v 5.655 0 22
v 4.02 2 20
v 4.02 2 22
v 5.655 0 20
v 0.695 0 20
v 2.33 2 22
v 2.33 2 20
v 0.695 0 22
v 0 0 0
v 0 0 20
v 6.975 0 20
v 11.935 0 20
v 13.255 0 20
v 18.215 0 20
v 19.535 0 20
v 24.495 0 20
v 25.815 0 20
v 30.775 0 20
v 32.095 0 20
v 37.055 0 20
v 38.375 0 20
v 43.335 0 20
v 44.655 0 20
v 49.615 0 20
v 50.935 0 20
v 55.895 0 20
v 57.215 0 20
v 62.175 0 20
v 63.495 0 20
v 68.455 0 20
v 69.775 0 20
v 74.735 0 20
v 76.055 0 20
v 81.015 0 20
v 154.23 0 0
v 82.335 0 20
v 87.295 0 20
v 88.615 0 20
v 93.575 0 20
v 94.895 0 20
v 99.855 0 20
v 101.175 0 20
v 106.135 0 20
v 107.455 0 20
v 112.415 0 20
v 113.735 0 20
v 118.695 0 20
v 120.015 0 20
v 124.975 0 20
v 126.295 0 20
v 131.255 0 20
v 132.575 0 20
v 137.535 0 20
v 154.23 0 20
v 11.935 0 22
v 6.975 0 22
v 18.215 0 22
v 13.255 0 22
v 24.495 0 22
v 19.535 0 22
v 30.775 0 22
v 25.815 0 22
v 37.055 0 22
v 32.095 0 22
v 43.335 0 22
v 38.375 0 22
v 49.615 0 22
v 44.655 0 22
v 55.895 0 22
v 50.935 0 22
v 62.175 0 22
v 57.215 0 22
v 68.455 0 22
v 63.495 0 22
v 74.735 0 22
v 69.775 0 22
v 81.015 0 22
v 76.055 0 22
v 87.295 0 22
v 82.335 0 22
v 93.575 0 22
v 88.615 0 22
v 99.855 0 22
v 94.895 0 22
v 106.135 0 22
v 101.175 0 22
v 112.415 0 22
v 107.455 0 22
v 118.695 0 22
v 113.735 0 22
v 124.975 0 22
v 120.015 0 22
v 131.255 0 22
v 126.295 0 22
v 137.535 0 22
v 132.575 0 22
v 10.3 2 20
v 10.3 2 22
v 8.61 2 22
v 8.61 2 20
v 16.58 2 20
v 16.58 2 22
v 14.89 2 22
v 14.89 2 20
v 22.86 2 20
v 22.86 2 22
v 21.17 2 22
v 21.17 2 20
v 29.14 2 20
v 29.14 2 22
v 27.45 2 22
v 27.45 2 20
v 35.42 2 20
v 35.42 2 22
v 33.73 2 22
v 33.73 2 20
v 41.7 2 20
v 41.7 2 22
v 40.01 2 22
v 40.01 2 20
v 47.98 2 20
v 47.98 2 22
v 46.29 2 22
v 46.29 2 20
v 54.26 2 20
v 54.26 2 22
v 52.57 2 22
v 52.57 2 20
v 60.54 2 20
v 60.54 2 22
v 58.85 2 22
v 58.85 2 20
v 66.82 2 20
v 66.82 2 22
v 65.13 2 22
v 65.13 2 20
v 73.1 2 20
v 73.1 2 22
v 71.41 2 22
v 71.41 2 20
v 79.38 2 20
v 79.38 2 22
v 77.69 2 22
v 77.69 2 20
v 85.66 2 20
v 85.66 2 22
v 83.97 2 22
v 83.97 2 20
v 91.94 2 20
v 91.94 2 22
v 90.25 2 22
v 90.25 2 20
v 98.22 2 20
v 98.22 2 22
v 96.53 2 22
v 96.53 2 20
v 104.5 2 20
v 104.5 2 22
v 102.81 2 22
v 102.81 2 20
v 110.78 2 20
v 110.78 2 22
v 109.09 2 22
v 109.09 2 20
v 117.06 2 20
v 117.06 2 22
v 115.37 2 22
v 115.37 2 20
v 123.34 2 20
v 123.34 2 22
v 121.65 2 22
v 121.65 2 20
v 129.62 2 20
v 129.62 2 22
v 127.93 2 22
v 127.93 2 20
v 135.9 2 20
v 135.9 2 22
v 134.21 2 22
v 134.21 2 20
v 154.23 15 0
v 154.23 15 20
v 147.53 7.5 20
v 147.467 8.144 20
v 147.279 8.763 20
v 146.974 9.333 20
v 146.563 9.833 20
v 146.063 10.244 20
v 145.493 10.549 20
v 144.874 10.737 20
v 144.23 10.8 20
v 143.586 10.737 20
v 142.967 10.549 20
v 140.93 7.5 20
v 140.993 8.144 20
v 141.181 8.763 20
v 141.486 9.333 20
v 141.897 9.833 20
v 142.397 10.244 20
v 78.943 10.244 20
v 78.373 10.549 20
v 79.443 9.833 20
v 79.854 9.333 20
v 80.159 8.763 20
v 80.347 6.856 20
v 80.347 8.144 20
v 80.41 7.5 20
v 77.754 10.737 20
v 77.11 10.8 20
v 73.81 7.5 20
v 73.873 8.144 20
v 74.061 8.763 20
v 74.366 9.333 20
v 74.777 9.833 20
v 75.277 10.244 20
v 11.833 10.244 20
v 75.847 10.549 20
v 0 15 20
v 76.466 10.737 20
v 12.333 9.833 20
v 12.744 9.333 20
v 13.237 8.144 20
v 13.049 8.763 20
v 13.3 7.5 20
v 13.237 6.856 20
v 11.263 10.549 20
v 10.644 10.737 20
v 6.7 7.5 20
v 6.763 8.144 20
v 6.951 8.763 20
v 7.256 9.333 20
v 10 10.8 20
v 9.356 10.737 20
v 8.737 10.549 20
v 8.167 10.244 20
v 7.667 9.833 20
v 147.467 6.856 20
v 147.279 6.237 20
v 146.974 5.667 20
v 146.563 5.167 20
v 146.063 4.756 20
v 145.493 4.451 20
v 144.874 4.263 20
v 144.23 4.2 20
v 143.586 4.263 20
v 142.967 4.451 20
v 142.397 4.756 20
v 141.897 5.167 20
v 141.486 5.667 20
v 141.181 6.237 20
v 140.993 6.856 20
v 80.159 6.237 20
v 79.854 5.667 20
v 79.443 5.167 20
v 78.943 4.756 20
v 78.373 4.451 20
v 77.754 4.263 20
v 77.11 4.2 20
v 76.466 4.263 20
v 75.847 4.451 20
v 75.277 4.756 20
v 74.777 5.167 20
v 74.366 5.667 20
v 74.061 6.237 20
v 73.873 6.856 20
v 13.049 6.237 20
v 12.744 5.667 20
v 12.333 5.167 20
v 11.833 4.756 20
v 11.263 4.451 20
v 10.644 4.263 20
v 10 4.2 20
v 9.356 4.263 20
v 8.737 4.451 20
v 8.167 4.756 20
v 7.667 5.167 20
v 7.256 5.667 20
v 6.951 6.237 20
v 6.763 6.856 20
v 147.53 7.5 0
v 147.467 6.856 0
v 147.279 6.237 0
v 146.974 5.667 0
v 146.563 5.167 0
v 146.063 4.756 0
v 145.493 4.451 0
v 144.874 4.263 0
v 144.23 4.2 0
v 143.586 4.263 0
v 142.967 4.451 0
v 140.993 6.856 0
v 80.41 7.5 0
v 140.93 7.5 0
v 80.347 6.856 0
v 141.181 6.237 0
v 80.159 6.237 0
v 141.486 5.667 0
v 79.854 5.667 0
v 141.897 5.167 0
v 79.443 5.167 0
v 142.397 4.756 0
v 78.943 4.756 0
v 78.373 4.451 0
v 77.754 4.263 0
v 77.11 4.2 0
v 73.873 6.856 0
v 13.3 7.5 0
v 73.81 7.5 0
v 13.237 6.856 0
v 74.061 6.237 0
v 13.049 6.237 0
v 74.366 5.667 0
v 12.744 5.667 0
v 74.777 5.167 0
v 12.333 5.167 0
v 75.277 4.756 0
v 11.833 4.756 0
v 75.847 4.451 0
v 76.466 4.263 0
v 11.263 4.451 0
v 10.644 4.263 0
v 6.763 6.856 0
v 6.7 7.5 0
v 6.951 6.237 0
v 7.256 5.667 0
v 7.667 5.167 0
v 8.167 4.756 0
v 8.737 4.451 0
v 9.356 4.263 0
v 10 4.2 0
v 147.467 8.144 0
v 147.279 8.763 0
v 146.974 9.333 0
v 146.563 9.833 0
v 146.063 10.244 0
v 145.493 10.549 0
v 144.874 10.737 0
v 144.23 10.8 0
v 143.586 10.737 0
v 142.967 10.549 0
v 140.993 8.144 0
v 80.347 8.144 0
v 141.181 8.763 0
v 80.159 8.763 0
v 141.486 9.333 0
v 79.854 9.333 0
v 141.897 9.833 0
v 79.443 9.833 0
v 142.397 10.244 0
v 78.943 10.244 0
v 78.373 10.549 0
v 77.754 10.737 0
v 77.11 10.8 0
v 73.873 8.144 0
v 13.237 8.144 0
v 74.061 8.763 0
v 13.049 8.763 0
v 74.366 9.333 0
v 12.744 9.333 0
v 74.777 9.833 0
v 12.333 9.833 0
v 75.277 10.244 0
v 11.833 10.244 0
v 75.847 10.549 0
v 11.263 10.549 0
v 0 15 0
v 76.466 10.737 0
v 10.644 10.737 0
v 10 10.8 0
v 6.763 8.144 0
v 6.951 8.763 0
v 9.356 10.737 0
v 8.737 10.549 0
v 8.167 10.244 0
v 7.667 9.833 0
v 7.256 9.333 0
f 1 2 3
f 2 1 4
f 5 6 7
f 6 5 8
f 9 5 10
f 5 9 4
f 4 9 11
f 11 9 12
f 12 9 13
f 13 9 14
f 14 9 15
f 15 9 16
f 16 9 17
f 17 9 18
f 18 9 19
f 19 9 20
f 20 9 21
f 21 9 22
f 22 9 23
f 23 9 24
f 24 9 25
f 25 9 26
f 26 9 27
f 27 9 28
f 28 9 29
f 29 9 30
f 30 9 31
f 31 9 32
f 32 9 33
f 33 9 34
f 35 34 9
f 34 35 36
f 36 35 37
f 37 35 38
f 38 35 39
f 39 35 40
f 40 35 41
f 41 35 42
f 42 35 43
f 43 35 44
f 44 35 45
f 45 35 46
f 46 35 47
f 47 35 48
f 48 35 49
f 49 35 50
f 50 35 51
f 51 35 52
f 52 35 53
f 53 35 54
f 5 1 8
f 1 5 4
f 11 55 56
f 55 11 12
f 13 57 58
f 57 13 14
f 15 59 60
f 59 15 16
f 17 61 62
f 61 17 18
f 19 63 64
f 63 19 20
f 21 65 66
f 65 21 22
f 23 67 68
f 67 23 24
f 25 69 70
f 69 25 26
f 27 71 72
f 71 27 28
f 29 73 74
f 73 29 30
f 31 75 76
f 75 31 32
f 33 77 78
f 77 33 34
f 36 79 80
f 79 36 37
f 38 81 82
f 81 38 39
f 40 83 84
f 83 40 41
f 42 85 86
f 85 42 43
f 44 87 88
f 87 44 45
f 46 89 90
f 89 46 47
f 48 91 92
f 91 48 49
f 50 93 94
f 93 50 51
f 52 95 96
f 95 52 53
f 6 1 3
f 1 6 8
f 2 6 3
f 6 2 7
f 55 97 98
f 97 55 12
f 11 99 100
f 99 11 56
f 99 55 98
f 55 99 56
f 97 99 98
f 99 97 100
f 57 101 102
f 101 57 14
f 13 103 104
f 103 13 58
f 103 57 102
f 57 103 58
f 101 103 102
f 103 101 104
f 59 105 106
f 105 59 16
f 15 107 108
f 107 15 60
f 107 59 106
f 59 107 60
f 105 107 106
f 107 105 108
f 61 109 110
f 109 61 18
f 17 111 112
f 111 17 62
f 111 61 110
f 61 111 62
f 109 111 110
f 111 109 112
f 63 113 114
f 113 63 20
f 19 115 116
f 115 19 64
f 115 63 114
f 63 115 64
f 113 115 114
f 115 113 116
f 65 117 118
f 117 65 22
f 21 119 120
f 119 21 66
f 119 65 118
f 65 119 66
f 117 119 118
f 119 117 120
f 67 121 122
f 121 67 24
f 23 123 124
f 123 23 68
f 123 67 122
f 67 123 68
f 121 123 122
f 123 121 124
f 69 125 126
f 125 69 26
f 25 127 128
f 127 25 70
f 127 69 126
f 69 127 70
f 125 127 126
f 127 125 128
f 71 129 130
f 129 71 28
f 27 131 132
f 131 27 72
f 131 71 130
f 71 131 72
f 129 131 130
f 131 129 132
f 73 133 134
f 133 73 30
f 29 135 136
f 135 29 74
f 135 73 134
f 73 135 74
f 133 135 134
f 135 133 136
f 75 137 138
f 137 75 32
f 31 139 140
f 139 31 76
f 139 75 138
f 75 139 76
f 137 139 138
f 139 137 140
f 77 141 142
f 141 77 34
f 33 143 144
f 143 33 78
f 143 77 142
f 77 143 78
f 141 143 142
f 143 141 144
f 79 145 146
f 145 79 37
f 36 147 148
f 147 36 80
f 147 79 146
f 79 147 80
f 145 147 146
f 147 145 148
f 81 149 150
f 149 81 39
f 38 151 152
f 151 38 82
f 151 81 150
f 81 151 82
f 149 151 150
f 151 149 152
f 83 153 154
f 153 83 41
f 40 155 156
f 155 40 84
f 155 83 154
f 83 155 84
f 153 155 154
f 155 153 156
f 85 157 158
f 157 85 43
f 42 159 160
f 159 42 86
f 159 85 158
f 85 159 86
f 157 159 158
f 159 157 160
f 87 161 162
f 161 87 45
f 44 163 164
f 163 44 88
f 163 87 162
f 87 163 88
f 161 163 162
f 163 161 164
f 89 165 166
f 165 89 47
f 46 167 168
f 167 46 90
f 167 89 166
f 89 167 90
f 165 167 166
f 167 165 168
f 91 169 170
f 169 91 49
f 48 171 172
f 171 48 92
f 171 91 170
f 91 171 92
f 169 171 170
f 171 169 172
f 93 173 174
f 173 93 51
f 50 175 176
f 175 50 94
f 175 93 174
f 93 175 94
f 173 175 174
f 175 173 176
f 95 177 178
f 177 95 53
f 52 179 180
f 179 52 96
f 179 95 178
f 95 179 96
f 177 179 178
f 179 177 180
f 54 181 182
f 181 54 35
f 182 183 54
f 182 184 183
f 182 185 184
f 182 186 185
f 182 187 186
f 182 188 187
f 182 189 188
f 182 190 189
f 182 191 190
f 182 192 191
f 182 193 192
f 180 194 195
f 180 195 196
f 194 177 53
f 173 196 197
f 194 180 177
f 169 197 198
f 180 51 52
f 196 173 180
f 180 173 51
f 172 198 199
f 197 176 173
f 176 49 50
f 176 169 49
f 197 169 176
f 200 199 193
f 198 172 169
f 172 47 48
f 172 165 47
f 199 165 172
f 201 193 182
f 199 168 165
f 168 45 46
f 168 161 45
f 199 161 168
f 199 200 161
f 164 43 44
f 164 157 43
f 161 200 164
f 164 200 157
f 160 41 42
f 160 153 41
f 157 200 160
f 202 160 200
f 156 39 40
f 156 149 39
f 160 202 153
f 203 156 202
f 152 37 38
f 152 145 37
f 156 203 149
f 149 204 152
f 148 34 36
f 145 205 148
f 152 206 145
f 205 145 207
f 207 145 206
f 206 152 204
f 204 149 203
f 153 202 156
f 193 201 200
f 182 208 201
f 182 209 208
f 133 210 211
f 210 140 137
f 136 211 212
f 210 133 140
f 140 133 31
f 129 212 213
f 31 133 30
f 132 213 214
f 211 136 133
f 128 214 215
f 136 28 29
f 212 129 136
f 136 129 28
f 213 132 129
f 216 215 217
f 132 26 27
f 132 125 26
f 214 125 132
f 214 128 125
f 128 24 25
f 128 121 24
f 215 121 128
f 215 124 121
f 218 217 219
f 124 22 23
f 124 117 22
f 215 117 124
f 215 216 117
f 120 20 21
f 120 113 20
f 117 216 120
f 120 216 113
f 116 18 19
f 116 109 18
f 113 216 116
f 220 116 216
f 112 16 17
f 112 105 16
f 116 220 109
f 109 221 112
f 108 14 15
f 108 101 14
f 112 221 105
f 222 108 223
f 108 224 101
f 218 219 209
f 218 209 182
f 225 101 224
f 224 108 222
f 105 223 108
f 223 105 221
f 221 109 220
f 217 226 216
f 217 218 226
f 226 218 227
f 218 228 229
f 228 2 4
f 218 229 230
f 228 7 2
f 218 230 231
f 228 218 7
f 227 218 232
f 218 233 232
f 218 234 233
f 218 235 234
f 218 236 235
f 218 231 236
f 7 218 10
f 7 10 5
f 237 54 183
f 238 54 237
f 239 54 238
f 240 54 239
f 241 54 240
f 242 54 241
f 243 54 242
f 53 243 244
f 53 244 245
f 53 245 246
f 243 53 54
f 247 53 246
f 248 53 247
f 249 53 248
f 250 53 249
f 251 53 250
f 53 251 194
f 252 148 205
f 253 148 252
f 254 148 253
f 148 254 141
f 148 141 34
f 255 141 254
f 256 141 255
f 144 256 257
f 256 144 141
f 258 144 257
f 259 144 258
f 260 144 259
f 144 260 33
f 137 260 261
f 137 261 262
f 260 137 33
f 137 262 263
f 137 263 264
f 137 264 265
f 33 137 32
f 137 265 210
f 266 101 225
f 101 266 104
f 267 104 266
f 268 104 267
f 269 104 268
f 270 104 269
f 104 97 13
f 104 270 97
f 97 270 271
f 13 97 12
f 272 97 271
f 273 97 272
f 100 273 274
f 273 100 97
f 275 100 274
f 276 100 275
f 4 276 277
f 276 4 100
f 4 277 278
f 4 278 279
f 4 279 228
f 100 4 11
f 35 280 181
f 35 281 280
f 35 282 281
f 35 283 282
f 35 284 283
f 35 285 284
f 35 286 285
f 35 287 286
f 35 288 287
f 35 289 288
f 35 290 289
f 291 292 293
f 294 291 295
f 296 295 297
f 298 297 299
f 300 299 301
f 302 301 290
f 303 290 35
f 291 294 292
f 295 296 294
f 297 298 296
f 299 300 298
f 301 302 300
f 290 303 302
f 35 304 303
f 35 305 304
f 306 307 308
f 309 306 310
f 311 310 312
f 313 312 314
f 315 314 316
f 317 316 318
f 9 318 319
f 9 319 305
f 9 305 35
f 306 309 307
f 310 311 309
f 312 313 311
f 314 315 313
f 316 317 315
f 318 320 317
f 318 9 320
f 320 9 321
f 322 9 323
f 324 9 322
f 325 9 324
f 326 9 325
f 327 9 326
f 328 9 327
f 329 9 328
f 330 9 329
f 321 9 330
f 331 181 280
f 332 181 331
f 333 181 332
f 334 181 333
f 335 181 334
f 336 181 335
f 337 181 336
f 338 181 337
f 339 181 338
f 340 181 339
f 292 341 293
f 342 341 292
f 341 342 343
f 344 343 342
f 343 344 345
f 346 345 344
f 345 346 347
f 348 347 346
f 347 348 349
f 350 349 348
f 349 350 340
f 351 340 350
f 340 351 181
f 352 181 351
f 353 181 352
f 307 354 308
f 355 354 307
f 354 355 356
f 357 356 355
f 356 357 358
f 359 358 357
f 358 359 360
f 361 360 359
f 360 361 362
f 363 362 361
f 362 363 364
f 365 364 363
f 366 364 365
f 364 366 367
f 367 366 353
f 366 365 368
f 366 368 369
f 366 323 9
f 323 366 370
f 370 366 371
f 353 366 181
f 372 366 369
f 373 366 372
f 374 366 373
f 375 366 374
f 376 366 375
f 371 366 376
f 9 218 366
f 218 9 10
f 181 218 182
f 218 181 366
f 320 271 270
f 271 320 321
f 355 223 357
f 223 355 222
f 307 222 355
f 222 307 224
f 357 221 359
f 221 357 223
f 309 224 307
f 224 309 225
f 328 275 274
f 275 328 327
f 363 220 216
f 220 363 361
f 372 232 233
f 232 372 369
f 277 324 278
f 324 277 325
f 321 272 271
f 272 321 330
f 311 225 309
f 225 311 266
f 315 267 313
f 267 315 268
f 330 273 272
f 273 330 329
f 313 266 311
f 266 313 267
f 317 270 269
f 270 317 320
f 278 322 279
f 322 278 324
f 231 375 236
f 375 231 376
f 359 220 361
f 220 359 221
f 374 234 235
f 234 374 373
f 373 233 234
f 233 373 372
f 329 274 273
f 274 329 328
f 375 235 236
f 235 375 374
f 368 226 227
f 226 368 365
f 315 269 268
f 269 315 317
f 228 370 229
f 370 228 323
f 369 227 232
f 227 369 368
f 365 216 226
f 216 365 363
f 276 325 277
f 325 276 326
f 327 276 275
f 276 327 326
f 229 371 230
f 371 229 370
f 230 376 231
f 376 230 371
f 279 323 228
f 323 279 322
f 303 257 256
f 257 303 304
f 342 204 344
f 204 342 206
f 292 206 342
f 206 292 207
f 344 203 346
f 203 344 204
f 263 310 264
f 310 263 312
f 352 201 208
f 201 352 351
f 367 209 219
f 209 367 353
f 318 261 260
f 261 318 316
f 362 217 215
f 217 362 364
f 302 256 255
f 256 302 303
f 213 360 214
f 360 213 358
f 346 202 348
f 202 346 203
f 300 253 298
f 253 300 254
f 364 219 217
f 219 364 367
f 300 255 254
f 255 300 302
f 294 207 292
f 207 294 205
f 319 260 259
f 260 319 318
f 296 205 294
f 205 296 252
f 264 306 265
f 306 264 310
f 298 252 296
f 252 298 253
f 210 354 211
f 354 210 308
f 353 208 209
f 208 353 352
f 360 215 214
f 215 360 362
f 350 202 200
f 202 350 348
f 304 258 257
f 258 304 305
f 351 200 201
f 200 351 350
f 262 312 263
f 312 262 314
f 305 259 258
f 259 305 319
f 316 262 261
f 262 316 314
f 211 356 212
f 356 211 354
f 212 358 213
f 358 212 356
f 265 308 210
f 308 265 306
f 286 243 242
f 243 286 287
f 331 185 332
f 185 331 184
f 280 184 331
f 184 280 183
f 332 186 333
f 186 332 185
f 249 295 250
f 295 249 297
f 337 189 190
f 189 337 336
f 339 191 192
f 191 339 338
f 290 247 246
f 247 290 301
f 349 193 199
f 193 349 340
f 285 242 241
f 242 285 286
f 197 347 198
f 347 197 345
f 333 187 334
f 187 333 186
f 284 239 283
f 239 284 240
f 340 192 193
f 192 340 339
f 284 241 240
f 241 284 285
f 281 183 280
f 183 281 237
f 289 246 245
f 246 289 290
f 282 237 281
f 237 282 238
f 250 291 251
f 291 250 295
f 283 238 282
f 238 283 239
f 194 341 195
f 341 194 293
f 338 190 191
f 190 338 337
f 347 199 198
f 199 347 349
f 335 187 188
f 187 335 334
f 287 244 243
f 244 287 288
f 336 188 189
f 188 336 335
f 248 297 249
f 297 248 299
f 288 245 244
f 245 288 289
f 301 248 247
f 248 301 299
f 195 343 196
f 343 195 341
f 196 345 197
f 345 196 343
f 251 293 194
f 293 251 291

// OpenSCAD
$fn = 32;

// ----------------------------------------------------------------------
// Gear rack: m=2 z=22, 154.23 x 15 x 22 mm
// ----------------------------------------------------------------------

// --- parameters (mm) ---
length = 154.23;          // rack length, X
width = 15;               // rack width, Y
height = 22;              // overall height, Z
module_m = 2;             // module
back_t = 20;              // tooth root line height
pitch = 6.28;             // circular pitch
tip_w = 1.69;             // tooth thickness at the tip
root_w = 4.96;            // tooth thickness at the root line
hole_d = 6.6;             // mounting hole
sink = 0.6;               // tooth root overlap into the body

tooth_span = 138.23;

module tooth(x0) {
  /* 20 deg flank profile, sunk into the body for a positive overlap */
  translate([x0, 0, back_t - sink])
    linear_extrude(height = height - back_t + sink)
      polygon(points = [[-root_w / 2, 0], [root_w / 2, 0],
                        [tip_w / 2, height - back_t],
                        [-tip_w / 2, height - back_t]]);
}

difference() {
  union() {
    cube([length, width, back_t]);
    for (i = [0 : 22 - 1])
      tooth((i + 0.5) * pitch + (tooth_span - 22 * pitch) / 2);
  }
  translate([10, 7.5, -1]) cylinder(h = back_t + 2, d = hole_d);
  translate([77.11, 7.5, -1]) cylinder(h = back_t + 2, d = hole_d);
  translate([144.23, 7.5, -1]) cylinder(h = back_t + 2, d = hole_d);
}
